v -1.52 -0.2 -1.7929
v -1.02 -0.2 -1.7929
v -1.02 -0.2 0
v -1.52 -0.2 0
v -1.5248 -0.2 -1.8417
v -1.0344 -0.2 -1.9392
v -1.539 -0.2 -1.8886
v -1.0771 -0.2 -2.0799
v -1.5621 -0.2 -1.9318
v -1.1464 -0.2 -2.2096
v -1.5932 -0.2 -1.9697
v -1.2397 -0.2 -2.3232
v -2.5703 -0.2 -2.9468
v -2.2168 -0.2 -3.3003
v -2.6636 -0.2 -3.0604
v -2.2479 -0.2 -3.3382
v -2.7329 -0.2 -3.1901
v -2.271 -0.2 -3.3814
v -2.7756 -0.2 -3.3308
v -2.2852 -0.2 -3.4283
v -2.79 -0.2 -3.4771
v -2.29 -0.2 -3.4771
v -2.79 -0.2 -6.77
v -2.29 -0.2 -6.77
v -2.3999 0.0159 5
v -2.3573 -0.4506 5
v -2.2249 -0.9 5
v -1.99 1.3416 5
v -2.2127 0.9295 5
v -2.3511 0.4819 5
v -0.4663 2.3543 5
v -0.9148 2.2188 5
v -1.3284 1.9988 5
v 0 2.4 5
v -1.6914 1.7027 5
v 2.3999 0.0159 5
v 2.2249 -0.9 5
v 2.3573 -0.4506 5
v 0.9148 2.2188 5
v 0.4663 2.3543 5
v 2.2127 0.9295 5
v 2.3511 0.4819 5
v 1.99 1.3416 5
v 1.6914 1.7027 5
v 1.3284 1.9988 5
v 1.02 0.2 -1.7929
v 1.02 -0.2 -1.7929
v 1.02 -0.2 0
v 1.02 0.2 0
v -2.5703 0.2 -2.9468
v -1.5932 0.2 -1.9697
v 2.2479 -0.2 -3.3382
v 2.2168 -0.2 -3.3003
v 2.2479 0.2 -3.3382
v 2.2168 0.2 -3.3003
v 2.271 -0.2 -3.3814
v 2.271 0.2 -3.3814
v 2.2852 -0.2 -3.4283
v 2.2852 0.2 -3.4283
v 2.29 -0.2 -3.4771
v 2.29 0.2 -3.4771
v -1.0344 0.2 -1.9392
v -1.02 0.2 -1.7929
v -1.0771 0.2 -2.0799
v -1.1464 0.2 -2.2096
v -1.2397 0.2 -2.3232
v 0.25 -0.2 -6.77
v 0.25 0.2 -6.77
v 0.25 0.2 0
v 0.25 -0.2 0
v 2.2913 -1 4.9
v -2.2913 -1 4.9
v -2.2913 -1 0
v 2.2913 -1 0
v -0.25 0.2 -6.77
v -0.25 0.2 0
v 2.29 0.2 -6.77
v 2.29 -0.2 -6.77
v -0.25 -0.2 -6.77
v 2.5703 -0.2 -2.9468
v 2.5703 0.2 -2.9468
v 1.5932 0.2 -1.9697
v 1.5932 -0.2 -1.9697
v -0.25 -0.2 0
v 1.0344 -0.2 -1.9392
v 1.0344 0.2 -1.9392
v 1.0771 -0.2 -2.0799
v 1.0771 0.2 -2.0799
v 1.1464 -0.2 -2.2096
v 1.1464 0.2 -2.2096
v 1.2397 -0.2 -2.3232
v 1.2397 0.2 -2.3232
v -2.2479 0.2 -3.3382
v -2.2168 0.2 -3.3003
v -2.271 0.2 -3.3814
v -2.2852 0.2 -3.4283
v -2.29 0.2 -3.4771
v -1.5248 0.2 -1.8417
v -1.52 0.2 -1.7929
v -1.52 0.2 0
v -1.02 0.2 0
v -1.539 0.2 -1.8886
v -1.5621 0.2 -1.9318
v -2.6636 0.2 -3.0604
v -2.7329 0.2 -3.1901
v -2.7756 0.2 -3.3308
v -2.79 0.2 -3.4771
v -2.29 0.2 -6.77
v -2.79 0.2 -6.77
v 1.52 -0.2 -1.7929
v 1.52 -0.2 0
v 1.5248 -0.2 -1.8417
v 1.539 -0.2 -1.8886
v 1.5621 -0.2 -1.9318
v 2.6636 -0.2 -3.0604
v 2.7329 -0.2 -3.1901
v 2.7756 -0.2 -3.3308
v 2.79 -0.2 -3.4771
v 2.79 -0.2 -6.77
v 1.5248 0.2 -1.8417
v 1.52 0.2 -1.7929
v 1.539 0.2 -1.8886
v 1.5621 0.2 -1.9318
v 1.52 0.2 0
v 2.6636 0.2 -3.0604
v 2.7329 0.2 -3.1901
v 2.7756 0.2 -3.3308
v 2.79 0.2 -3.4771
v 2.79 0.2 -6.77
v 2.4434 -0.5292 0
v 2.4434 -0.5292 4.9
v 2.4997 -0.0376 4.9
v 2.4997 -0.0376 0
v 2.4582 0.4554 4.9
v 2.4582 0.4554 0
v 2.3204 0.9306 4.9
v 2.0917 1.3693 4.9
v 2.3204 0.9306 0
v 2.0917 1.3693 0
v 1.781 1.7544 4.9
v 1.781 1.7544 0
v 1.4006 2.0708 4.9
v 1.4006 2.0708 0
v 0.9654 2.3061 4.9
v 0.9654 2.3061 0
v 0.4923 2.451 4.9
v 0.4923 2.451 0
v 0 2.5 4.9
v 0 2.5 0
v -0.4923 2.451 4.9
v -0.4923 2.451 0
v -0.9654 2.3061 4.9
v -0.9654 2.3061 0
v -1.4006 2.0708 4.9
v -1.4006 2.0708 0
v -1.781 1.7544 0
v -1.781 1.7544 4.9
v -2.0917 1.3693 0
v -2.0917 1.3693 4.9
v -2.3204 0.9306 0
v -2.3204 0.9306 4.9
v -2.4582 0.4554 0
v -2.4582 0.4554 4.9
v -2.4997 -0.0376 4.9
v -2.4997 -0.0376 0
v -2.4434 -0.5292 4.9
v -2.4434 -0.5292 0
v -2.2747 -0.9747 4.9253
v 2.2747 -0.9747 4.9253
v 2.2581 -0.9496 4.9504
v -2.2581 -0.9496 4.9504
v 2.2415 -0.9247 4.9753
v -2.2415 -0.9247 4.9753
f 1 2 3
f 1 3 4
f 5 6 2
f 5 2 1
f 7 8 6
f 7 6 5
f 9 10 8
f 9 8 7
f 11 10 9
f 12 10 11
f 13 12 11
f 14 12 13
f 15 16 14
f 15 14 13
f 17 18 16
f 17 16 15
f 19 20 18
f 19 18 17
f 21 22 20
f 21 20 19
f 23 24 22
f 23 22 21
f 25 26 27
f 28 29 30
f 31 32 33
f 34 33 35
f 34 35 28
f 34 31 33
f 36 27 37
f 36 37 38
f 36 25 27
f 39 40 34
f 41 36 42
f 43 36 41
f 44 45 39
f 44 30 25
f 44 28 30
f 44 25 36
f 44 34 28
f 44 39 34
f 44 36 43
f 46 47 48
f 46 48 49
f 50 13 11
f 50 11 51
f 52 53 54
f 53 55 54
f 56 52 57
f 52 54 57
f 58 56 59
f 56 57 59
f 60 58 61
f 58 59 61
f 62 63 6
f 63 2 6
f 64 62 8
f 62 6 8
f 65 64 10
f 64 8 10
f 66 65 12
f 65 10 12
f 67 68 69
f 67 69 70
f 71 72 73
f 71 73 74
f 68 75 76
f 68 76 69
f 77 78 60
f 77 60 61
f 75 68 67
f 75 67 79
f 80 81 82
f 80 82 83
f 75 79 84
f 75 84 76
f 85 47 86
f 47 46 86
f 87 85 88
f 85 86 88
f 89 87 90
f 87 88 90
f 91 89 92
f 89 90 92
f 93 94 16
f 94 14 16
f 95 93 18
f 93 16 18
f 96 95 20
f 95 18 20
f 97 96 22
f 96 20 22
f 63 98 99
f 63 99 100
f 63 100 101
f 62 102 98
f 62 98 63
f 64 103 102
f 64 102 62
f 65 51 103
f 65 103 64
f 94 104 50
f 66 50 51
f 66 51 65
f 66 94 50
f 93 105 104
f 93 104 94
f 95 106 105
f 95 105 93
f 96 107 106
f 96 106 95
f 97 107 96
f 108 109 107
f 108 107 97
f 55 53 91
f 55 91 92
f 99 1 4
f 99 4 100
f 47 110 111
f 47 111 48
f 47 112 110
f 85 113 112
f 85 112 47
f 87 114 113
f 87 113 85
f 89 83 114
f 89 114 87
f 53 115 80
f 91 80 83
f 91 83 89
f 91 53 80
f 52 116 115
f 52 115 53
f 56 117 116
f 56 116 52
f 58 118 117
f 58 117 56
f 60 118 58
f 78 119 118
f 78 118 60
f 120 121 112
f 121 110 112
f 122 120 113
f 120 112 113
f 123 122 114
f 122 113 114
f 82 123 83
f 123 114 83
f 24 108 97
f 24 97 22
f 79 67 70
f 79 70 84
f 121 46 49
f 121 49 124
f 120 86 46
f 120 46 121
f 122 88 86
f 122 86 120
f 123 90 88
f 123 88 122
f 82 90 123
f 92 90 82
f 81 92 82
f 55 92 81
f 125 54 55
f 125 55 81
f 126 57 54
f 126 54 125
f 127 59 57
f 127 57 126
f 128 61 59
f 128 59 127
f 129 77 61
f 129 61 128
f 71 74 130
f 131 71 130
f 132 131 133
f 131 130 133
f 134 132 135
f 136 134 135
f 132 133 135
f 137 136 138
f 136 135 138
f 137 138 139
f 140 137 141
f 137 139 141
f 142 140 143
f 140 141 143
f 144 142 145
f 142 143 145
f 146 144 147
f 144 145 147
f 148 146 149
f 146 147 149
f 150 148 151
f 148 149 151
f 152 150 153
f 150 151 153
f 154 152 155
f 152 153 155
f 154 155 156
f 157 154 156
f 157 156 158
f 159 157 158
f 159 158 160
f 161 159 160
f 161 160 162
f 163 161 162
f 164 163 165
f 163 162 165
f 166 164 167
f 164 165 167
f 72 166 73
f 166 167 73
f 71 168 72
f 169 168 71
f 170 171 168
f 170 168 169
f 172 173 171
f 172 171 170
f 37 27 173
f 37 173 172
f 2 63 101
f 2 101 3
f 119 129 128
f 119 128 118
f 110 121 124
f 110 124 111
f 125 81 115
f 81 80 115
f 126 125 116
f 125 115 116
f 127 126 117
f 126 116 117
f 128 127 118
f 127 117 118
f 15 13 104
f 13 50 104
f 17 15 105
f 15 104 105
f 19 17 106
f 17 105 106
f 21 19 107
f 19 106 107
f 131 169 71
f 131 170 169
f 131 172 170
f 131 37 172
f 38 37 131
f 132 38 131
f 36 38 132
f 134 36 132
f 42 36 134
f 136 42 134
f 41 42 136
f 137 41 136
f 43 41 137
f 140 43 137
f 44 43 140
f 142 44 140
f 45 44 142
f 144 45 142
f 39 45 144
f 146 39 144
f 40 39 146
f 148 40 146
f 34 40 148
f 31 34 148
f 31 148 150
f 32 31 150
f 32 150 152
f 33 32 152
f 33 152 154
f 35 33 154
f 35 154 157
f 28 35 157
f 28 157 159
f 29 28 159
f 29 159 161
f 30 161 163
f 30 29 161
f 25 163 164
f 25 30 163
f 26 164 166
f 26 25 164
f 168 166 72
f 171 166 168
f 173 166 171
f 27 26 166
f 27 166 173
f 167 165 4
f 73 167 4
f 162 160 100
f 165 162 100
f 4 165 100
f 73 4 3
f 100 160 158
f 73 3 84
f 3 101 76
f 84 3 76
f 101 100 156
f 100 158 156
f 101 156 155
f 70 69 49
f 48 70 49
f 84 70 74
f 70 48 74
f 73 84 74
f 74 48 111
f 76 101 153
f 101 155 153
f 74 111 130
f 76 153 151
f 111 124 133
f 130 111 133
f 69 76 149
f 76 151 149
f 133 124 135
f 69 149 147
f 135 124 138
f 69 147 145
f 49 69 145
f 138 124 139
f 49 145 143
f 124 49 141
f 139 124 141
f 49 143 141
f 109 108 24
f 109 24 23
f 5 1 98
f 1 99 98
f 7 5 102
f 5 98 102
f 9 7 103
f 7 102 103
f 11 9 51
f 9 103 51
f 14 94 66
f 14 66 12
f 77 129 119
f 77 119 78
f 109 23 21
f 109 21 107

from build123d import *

# Parameters (mm, degrees)
F1_DEPTH = 5
F2_SIZE  = 0.1
F3_W     = 0.5
F3_H     = 0.4


with BuildPart() as f1:
    # F0 (on Top) → F1 (new body)
    with BuildSketch(Plane.XY):
        with BuildLine():
            Line((-2.291288, -1), (2.291288, -1))
            ThreePointArc((2.291288, -1), (0, 2.5), (-2.291288, -1))
        make_face()
    extrude(amount=F1_DEPTH)

    # F2
    f2_edges = [f1.edges().sort_by_distance(p)[0] for p in [
        (0, -1, 5),
        (0, 2.5, 5),
    ]]
    chamfer(f2_edges, length=F2_SIZE)

    # F5: sweep along a path in F4
    with BuildLine(Plane.XZ) as f5_path:
        Line((-1.27, 0), (-1.27, -1.792893))
        ThreePointArc((-1.27, -1.792893), (-1.30806, -1.984235), (-1.416447, -2.146447))
        Line((-1.416447, -2.146447), (-2.393553, -3.123553))
        ThreePointArc((-2.393553, -3.123553), (-2.50194, -3.285765), (-2.54, -3.477107))
        Line((-2.54, -3.477107), (-2.54, -6.77))
    # F3 (on face) → F5 (sweep)
    with BuildSketch(Plane(origin=(0, 0, 0), x_dir=(1, 0, 0), z_dir=(0, 0, -1))):
        with Locations((-1.27, 0)):
            Rectangle(F3_W, F3_H)
    sweep(path=f5_path.line)

    # F6: sweep along a path in F4
    with BuildLine(Plane.XZ) as f6_path:
        Line((0, 0), (0, -6.77))
    # F3 (on face) → F6 (sweep)
    with BuildSketch(Plane(origin=(0, 0, 0), x_dir=(1, 0, 0), z_dir=(0, 0, -1))):
        Rectangle(F3_W, F3_H)
    sweep(path=f6_path.line)

    # F7: sweep along a path in F4
    with BuildLine(Plane.XZ) as f7_path:
        Line((1.27, 0), (1.27, -1.792893))
        ThreePointArc((1.27, -1.792893), (1.30806, -1.984235), (1.416447, -2.146447))
        Line((1.416447, -2.146447), (2.393553, -3.123553))
        ThreePointArc((2.393553, -3.123553), (2.50194, -3.285765), (2.54, -3.477107))
        Line((2.54, -3.477107), (2.54, -6.77))
    # F3 (on face) → F7 (sweep)
    with BuildSketch(Plane(origin=(0, 0, 0), x_dir=(1, 0, 0), z_dir=(0, 0, -1))):
        with Locations((1.27, 0)):
            Rectangle(F3_W, F3_H)
    sweep(path=f7_path.line)


solid = f1.part
